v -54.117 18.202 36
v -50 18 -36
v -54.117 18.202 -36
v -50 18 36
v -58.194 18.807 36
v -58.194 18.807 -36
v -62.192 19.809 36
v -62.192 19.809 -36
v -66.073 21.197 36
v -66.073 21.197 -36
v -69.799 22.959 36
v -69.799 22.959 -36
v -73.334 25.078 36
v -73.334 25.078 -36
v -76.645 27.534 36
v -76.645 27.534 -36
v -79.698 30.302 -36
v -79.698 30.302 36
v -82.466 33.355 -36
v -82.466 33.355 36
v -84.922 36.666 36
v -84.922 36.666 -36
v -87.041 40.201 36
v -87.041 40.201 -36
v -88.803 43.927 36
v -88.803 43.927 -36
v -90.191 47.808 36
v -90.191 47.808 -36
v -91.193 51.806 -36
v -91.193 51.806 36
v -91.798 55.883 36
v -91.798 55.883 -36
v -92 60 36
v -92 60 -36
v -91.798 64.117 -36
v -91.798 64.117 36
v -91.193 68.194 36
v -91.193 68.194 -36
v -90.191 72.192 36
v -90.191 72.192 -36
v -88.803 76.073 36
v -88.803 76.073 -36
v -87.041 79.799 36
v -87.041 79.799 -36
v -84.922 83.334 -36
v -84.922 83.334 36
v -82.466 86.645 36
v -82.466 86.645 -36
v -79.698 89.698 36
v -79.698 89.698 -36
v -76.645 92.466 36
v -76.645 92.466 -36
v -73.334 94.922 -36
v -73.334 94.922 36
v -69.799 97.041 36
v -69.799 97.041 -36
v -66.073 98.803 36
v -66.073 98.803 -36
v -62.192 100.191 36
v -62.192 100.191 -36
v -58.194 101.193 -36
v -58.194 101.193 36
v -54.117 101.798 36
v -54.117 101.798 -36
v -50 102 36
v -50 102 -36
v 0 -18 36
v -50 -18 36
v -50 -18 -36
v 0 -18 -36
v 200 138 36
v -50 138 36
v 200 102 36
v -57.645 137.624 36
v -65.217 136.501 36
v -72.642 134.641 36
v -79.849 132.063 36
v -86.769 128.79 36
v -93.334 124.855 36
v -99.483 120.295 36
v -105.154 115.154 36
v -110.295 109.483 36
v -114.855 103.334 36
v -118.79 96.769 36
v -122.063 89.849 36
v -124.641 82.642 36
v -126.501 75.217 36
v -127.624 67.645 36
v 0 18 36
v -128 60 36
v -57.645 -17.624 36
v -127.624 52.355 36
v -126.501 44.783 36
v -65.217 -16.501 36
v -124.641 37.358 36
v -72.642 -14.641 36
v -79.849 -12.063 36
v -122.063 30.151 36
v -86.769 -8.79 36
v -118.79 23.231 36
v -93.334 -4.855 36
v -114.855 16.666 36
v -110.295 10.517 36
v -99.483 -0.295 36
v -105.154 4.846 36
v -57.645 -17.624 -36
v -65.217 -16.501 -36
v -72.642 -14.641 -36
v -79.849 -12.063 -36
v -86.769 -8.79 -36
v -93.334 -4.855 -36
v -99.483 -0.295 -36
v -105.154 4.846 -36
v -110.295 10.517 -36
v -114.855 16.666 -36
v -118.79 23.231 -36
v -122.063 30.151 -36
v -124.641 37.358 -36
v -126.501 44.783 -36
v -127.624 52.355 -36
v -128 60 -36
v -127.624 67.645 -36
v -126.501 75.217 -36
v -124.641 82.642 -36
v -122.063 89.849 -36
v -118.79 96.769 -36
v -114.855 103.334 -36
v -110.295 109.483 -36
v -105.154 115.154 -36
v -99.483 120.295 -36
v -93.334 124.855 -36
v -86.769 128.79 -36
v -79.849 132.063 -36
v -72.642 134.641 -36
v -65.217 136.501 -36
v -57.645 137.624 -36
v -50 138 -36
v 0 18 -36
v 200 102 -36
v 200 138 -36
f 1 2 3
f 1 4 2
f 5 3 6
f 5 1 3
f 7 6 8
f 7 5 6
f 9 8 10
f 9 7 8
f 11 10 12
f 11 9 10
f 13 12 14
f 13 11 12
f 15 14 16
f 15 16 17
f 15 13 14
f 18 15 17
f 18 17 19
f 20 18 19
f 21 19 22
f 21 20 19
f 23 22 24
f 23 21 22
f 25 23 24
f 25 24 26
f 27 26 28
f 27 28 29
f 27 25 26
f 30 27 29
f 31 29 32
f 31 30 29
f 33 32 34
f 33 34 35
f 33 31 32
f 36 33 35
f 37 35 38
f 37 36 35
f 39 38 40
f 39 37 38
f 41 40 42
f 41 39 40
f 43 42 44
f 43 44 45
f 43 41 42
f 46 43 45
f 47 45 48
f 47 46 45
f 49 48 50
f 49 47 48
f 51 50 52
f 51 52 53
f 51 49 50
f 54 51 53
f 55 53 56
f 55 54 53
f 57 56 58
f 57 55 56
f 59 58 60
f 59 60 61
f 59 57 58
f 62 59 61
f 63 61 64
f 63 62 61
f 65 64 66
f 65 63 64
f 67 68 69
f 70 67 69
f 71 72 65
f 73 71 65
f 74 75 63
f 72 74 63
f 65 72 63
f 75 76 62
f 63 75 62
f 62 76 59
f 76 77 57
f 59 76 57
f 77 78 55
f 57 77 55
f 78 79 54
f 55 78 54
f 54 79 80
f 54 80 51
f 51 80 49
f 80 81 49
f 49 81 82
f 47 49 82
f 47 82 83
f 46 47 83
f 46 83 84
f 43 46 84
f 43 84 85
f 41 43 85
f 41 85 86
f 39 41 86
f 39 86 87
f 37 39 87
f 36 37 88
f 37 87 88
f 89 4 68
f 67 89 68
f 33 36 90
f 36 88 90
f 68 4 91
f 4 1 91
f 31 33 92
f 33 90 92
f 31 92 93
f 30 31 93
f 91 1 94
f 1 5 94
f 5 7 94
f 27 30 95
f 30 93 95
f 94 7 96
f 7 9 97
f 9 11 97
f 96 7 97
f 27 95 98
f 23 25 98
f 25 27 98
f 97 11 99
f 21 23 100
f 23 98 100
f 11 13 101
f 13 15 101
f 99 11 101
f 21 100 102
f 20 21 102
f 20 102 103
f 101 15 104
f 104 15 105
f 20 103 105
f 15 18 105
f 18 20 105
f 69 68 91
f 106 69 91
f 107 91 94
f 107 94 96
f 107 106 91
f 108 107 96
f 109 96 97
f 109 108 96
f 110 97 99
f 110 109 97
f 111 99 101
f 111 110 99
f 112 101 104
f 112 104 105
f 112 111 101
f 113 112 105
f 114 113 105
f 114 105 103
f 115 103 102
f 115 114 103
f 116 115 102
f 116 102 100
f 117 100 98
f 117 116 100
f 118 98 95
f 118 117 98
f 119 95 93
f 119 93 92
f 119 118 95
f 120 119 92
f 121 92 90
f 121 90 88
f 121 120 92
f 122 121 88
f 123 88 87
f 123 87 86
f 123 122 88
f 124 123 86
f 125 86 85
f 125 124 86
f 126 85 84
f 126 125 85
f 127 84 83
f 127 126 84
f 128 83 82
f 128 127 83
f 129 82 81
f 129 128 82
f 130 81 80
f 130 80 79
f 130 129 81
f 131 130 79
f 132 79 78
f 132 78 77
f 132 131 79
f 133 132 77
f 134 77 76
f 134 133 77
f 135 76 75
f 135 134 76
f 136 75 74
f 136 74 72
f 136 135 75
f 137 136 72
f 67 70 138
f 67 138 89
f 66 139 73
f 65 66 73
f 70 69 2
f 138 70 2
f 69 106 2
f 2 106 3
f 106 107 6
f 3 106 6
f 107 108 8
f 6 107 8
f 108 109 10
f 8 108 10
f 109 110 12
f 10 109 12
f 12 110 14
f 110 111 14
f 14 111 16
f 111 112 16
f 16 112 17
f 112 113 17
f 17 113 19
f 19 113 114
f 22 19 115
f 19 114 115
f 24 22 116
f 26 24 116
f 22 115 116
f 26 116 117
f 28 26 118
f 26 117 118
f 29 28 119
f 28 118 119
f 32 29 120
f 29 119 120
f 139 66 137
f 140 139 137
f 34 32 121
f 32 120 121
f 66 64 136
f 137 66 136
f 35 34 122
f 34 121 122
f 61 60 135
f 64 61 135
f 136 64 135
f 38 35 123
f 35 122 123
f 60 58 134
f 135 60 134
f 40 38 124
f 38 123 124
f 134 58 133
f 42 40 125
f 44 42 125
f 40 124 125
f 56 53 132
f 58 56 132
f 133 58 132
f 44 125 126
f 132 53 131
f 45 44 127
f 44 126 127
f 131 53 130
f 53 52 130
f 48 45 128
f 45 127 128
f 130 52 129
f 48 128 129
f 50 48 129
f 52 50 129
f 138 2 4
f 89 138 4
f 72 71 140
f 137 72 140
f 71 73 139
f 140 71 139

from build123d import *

# Parameters (mm, degrees)
SKETCH2_W = 72
SKETCH2_H = 36


with BuildPart() as part:
    # Sweep1: sweep along a path in Sketch1
    with BuildLine(Plane.XY) as sweep1_path:
        Line((0, 0), (-50, 0))
        ThreePointArc((-50, 0), (-110, 60), (-50, 120))
        Line((-50, 120), (200, 120))
    # Sketch2 → Sweep1 (sweep)
    with BuildSketch(Plane(origin=(0, 0, 0), x_dir=(0, 0, -1), z_dir=(1, 0, 0))):
        Rectangle(SKETCH2_W, SKETCH2_H)
    sweep(path=sweep1_path.line)


solid = part.part
